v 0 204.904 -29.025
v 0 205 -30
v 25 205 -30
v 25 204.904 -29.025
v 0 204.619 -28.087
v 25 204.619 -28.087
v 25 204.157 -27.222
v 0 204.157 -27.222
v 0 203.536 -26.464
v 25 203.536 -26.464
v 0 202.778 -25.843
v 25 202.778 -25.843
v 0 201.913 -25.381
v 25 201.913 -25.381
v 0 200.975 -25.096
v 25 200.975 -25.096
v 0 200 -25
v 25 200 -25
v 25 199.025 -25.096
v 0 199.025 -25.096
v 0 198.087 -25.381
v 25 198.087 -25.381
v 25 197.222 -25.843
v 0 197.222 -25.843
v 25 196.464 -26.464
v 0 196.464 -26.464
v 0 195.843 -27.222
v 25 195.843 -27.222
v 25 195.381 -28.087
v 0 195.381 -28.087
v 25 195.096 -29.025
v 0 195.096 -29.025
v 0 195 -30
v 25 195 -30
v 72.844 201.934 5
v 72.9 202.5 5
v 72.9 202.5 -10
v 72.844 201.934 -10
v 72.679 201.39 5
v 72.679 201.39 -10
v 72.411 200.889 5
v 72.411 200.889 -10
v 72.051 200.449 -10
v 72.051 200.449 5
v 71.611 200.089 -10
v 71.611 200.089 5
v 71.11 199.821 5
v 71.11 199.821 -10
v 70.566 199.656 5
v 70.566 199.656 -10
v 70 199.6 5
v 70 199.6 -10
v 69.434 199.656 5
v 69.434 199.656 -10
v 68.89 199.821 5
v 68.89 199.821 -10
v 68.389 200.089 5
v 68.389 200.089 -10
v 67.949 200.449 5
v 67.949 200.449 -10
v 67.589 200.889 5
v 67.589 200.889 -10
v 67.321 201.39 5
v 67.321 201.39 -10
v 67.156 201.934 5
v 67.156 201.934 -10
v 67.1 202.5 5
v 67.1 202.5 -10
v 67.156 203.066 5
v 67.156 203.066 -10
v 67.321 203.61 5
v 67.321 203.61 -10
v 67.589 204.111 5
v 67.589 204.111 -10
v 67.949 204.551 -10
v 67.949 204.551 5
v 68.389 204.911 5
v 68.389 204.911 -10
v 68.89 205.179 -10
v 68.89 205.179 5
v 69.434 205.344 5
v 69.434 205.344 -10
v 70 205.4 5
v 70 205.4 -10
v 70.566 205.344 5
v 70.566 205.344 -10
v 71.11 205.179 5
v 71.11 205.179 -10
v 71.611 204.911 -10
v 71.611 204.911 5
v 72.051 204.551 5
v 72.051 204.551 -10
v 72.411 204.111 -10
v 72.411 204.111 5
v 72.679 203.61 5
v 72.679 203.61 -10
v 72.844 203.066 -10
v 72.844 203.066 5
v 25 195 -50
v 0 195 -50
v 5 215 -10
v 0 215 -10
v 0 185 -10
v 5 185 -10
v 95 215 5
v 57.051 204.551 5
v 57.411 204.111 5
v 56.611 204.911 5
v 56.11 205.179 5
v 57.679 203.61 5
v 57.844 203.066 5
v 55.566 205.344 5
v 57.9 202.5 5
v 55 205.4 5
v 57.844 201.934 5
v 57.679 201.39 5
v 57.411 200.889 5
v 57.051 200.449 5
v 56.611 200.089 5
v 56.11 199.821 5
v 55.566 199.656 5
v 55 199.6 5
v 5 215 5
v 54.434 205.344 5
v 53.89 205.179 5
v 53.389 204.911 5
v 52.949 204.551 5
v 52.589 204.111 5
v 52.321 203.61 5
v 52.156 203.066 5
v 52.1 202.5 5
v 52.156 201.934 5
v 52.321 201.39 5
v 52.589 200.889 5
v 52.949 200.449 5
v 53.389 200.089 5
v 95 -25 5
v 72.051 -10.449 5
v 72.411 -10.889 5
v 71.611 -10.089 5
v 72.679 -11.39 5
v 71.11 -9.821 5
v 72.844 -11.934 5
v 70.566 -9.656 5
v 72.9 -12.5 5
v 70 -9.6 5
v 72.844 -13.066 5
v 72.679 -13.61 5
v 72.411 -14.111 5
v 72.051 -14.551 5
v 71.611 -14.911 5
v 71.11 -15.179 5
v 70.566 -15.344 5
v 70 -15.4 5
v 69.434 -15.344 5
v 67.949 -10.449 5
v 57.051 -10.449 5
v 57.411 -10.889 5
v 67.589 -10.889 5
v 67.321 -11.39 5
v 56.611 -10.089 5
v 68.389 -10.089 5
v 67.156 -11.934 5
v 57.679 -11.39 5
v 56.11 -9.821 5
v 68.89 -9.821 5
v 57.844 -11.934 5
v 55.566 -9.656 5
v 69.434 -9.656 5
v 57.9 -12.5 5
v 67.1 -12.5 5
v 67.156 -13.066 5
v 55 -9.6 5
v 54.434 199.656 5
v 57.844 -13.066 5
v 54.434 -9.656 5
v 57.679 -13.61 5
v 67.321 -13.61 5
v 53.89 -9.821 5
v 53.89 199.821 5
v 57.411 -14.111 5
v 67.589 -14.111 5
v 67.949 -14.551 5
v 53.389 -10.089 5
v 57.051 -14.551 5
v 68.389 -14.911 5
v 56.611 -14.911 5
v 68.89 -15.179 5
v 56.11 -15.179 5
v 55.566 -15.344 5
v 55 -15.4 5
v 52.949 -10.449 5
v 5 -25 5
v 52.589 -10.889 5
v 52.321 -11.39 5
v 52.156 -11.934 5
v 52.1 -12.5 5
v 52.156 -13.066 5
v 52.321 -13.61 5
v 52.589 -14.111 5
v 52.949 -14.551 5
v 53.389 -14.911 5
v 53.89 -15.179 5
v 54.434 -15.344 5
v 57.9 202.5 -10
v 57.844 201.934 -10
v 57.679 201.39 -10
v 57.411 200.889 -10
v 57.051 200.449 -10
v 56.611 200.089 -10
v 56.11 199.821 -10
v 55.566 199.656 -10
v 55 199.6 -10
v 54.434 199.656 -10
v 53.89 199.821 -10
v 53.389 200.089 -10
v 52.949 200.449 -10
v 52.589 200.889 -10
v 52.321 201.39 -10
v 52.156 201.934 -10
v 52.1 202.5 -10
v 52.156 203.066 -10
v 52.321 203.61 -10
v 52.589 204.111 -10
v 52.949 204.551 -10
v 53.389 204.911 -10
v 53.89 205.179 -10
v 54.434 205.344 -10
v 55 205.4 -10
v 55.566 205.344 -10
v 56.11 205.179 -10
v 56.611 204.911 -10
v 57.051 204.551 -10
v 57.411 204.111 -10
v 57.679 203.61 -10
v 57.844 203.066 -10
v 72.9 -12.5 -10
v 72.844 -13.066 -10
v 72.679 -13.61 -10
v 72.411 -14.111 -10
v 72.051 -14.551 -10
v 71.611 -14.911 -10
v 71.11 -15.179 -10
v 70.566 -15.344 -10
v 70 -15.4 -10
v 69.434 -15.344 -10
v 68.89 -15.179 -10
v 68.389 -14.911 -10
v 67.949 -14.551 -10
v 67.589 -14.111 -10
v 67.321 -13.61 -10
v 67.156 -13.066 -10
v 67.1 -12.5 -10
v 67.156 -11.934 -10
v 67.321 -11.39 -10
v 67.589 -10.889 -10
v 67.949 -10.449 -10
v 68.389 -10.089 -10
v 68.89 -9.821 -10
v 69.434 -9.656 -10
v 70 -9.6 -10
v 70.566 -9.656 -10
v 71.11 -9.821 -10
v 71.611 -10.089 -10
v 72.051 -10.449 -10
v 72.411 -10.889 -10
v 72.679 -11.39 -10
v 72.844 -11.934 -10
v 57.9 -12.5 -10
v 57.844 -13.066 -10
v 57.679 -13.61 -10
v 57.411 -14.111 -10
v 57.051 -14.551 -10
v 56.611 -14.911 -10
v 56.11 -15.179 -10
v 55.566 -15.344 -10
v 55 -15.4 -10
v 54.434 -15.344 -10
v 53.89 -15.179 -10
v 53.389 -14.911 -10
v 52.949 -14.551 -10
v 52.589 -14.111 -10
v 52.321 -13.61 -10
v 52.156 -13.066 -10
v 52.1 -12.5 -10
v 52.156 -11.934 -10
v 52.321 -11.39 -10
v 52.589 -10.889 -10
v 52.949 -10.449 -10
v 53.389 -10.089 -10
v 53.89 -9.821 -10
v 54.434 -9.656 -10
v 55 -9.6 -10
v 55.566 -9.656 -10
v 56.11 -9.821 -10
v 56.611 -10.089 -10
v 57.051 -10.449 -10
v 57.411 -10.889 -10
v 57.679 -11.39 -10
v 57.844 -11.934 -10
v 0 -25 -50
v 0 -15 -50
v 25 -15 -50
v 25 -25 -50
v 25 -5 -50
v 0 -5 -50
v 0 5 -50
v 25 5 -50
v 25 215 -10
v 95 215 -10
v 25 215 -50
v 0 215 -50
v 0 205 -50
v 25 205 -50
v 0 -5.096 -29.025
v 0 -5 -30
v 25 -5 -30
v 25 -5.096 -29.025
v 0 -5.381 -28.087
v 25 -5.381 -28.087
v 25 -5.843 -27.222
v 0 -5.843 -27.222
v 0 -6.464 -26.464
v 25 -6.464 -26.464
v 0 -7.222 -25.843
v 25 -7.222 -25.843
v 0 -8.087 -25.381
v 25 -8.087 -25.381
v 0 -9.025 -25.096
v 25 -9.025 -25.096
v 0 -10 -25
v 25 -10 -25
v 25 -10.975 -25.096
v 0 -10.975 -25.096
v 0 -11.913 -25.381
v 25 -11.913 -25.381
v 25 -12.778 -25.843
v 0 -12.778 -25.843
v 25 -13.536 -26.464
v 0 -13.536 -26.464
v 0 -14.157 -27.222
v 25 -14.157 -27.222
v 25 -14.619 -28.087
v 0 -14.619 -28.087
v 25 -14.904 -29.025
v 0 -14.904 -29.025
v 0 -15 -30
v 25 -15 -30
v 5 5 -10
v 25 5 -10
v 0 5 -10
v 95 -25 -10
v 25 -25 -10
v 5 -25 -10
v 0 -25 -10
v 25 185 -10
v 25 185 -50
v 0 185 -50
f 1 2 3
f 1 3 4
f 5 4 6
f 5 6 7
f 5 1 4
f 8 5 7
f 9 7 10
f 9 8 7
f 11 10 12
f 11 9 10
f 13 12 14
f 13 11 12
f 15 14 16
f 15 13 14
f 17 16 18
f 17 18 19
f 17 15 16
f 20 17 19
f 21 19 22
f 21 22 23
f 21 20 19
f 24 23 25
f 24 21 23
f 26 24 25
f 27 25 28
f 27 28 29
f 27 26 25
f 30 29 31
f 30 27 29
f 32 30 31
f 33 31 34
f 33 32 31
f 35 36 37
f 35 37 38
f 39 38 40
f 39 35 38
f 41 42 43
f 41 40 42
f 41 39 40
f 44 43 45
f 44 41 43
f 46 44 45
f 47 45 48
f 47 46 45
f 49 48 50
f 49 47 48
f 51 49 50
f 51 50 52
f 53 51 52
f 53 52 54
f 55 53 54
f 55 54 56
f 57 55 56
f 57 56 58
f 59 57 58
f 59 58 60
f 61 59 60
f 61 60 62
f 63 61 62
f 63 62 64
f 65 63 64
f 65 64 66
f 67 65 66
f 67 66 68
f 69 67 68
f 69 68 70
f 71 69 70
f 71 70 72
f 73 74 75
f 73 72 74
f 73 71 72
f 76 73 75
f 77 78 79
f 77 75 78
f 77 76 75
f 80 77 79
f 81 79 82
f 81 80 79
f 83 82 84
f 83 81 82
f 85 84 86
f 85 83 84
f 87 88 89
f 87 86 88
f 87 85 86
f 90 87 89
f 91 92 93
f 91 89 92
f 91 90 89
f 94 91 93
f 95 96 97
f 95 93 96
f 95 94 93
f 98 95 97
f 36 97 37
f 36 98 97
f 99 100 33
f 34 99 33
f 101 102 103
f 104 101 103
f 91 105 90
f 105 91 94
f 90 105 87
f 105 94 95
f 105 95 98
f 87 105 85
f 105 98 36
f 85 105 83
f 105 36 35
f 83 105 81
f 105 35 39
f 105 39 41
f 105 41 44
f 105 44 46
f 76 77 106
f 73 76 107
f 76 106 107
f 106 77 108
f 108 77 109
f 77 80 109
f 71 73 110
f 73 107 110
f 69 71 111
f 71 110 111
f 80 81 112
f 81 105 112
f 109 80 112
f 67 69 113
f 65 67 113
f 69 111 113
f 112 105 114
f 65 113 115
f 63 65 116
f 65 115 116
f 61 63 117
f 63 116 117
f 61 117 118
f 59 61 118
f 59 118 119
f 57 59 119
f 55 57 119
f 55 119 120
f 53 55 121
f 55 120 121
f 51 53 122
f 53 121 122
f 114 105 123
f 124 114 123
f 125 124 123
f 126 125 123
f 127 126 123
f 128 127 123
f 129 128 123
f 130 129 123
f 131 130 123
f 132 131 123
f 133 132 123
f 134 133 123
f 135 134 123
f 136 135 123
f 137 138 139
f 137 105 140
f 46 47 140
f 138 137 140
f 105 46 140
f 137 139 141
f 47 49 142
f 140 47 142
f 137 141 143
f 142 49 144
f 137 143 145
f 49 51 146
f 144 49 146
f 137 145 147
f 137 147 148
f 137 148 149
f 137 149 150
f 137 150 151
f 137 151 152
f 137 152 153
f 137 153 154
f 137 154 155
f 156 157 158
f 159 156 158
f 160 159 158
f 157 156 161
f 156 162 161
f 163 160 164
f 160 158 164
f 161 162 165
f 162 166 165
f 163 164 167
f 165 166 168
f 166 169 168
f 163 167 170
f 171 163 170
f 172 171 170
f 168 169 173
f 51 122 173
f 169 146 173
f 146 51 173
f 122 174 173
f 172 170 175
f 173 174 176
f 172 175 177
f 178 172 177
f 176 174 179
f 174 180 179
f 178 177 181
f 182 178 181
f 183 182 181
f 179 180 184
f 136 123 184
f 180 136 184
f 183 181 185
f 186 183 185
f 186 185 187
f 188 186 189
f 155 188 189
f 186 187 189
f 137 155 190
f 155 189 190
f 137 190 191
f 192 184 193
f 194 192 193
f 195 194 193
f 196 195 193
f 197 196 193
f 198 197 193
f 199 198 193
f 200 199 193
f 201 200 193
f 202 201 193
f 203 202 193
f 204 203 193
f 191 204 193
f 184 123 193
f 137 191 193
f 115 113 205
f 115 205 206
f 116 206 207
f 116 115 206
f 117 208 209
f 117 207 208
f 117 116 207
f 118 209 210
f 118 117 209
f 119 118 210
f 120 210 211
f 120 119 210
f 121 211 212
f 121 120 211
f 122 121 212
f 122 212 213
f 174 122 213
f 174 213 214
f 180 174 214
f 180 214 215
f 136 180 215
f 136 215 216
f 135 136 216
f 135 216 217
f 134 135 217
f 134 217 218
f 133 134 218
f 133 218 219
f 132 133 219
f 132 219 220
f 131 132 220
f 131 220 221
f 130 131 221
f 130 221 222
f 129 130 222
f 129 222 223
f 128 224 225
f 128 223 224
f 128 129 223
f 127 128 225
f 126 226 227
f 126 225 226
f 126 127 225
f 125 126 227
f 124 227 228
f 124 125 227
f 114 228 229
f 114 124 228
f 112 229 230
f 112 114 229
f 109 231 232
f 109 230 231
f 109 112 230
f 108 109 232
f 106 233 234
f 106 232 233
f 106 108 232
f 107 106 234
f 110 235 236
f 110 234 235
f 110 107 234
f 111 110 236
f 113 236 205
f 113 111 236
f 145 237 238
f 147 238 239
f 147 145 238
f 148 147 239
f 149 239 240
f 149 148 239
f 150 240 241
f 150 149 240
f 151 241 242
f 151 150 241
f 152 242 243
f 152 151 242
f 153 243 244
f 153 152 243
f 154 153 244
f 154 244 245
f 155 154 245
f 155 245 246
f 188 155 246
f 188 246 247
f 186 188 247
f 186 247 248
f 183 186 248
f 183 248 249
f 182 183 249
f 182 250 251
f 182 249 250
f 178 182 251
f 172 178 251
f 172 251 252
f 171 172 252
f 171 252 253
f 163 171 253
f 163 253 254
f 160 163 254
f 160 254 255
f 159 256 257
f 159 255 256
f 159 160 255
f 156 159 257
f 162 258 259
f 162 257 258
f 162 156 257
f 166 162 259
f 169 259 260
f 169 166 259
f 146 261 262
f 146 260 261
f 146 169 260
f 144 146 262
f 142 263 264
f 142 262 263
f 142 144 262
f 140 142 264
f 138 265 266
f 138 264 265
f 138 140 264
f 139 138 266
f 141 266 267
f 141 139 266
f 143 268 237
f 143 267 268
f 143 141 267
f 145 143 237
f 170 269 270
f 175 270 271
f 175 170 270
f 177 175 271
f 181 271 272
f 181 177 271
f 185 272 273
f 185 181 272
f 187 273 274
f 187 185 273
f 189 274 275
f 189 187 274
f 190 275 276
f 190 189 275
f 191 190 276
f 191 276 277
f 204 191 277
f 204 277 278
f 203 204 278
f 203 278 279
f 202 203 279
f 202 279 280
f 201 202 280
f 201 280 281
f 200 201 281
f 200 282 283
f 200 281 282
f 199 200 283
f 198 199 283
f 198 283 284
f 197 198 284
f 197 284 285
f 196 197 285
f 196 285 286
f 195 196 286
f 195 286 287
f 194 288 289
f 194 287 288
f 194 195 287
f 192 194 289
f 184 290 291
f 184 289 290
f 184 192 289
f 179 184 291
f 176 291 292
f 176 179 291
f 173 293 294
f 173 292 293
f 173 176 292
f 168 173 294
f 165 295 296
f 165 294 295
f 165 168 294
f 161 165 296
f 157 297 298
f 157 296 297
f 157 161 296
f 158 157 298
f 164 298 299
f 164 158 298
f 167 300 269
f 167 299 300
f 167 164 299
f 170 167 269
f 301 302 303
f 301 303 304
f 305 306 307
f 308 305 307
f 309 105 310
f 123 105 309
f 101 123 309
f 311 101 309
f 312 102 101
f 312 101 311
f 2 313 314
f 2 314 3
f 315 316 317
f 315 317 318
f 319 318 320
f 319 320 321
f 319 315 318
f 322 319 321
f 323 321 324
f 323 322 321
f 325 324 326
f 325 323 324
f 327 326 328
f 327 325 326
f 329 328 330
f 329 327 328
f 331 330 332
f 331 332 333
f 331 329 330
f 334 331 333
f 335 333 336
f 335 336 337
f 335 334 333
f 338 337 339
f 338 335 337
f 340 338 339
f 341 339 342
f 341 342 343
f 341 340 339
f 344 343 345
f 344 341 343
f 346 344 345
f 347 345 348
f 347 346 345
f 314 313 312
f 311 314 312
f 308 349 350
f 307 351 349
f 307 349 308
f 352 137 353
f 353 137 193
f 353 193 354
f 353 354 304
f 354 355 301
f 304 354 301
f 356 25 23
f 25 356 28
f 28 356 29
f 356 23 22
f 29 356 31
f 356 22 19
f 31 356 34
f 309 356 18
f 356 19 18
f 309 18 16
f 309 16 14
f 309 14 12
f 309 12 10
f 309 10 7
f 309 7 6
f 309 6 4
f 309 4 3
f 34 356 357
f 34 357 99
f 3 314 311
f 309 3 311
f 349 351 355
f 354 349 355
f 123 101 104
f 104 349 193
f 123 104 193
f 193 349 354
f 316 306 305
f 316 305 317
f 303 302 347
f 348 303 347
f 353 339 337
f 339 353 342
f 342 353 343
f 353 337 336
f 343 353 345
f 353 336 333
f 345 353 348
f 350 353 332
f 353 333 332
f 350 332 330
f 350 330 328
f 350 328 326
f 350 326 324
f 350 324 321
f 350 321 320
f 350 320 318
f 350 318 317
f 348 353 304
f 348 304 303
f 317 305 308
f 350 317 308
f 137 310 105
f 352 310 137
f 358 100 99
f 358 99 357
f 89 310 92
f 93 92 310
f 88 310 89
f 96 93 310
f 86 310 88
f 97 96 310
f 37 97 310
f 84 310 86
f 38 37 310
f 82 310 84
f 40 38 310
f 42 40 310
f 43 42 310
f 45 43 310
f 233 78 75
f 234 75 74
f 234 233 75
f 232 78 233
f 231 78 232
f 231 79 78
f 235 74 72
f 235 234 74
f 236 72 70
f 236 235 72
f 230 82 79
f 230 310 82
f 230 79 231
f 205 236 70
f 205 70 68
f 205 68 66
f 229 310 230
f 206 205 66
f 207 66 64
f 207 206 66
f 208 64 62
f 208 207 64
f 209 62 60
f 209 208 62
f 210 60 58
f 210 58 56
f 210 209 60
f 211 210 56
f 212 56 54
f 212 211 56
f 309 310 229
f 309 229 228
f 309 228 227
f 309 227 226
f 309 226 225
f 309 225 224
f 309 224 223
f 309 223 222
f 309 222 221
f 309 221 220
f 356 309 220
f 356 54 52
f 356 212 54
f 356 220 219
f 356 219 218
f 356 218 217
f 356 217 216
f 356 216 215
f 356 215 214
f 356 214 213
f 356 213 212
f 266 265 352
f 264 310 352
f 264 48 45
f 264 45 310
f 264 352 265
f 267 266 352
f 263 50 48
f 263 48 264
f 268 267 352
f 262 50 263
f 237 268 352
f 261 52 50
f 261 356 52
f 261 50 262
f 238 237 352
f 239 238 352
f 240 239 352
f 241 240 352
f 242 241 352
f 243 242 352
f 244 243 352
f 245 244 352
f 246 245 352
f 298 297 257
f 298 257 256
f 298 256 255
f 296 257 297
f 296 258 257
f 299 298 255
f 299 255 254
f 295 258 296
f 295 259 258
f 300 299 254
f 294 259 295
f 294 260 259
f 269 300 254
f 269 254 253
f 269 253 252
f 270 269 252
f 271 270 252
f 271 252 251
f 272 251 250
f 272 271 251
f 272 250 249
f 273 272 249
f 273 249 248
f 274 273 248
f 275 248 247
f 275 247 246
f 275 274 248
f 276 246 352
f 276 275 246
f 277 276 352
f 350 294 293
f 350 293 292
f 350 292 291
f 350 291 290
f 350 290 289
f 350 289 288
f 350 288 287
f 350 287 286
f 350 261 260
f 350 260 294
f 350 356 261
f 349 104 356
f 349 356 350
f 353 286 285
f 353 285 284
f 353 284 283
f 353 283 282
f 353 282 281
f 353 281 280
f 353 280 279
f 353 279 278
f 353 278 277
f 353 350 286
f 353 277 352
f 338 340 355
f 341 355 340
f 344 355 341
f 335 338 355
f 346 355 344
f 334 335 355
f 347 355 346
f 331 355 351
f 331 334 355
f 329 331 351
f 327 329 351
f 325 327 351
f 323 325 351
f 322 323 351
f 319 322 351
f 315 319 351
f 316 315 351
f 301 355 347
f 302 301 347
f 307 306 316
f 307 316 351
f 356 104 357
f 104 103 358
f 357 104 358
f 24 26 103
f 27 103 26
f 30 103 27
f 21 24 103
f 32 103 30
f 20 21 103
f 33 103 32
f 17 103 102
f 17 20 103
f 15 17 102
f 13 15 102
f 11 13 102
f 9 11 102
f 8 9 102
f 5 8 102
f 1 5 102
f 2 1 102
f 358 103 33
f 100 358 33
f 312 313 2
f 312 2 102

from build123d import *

# Parameters (mm, degrees)
SKETCH011_W              = 240
SKETCH011_H              = 15
PAD007_DEPTH             = 90
SKETCH012_R              = 2.9
HOLE004_DEPTH            = 270.001
PAD008_DEPTH             = 25
CLONE007_PLACEMENT_ANGLE = 180


with BuildPart() as part:
    # Sketch011 → Pad007 (new body)
    with BuildSketch(Plane.YZ.offset(5)):
        with Locations((95, 262.5)):
            Rectangle(SKETCH011_W, SKETCH011_H)
    extrude(amount=PAD007_DEPTH)

    # Sketch012 → Hole004 (cut, through all)
    with BuildSketch(Plane.XY):
        with Locations((55, 202.5)):
            Circle(SKETCH012_R)
        with Locations((70, 202.5)):
            Circle(SKETCH012_R)
        with Locations((55, -12.5)):
            Circle(SKETCH012_R)
        with Locations((70, -12.5)):
            Circle(SKETCH012_R)
    extrude(amount=HOLE004_DEPTH, mode=Mode.SUBTRACT)

    # Sketch013 → Pad008 (join)
    with BuildSketch(Plane.YZ):
        with BuildLine():
            Line((-25, 270), (-25, 310))
            Line((-15, 310), (-25, 310))
            Line((-15, 310), (-15, 290))
            ThreePointArc((-15, 290), (-10, 285), (-5, 290))
            Line((-5, 310), (-5, 290))
            Line((-5, 310), (5, 310))
            Line((5, 270), (5, 310))
            Line((-25, 270), (5, 270))
        make_face()
        with BuildLine():
            Line((185, 270), (185, 310))
            Line((195, 310), (185, 310))
            Line((195, 310), (195, 290))
            ThreePointArc((195, 290), (200, 285), (205, 290))
            Line((205, 310), (205, 290))
            Line((205, 310), (215, 310))
            Line((215, 270), (215, 310))
            Line((185, 270), (215, 270))
        make_face()
    extrude(amount=PAD008_DEPTH)


with BuildPart() as part_1:
    # Clone007 placement: moved
    add(part.part.moved(Location((0, 190, 260))).rotate(Axis((0, 190, 260), (1, 0, 0)), CLONE007_PLACEMENT_ANGLE))


solid = part_1.part
